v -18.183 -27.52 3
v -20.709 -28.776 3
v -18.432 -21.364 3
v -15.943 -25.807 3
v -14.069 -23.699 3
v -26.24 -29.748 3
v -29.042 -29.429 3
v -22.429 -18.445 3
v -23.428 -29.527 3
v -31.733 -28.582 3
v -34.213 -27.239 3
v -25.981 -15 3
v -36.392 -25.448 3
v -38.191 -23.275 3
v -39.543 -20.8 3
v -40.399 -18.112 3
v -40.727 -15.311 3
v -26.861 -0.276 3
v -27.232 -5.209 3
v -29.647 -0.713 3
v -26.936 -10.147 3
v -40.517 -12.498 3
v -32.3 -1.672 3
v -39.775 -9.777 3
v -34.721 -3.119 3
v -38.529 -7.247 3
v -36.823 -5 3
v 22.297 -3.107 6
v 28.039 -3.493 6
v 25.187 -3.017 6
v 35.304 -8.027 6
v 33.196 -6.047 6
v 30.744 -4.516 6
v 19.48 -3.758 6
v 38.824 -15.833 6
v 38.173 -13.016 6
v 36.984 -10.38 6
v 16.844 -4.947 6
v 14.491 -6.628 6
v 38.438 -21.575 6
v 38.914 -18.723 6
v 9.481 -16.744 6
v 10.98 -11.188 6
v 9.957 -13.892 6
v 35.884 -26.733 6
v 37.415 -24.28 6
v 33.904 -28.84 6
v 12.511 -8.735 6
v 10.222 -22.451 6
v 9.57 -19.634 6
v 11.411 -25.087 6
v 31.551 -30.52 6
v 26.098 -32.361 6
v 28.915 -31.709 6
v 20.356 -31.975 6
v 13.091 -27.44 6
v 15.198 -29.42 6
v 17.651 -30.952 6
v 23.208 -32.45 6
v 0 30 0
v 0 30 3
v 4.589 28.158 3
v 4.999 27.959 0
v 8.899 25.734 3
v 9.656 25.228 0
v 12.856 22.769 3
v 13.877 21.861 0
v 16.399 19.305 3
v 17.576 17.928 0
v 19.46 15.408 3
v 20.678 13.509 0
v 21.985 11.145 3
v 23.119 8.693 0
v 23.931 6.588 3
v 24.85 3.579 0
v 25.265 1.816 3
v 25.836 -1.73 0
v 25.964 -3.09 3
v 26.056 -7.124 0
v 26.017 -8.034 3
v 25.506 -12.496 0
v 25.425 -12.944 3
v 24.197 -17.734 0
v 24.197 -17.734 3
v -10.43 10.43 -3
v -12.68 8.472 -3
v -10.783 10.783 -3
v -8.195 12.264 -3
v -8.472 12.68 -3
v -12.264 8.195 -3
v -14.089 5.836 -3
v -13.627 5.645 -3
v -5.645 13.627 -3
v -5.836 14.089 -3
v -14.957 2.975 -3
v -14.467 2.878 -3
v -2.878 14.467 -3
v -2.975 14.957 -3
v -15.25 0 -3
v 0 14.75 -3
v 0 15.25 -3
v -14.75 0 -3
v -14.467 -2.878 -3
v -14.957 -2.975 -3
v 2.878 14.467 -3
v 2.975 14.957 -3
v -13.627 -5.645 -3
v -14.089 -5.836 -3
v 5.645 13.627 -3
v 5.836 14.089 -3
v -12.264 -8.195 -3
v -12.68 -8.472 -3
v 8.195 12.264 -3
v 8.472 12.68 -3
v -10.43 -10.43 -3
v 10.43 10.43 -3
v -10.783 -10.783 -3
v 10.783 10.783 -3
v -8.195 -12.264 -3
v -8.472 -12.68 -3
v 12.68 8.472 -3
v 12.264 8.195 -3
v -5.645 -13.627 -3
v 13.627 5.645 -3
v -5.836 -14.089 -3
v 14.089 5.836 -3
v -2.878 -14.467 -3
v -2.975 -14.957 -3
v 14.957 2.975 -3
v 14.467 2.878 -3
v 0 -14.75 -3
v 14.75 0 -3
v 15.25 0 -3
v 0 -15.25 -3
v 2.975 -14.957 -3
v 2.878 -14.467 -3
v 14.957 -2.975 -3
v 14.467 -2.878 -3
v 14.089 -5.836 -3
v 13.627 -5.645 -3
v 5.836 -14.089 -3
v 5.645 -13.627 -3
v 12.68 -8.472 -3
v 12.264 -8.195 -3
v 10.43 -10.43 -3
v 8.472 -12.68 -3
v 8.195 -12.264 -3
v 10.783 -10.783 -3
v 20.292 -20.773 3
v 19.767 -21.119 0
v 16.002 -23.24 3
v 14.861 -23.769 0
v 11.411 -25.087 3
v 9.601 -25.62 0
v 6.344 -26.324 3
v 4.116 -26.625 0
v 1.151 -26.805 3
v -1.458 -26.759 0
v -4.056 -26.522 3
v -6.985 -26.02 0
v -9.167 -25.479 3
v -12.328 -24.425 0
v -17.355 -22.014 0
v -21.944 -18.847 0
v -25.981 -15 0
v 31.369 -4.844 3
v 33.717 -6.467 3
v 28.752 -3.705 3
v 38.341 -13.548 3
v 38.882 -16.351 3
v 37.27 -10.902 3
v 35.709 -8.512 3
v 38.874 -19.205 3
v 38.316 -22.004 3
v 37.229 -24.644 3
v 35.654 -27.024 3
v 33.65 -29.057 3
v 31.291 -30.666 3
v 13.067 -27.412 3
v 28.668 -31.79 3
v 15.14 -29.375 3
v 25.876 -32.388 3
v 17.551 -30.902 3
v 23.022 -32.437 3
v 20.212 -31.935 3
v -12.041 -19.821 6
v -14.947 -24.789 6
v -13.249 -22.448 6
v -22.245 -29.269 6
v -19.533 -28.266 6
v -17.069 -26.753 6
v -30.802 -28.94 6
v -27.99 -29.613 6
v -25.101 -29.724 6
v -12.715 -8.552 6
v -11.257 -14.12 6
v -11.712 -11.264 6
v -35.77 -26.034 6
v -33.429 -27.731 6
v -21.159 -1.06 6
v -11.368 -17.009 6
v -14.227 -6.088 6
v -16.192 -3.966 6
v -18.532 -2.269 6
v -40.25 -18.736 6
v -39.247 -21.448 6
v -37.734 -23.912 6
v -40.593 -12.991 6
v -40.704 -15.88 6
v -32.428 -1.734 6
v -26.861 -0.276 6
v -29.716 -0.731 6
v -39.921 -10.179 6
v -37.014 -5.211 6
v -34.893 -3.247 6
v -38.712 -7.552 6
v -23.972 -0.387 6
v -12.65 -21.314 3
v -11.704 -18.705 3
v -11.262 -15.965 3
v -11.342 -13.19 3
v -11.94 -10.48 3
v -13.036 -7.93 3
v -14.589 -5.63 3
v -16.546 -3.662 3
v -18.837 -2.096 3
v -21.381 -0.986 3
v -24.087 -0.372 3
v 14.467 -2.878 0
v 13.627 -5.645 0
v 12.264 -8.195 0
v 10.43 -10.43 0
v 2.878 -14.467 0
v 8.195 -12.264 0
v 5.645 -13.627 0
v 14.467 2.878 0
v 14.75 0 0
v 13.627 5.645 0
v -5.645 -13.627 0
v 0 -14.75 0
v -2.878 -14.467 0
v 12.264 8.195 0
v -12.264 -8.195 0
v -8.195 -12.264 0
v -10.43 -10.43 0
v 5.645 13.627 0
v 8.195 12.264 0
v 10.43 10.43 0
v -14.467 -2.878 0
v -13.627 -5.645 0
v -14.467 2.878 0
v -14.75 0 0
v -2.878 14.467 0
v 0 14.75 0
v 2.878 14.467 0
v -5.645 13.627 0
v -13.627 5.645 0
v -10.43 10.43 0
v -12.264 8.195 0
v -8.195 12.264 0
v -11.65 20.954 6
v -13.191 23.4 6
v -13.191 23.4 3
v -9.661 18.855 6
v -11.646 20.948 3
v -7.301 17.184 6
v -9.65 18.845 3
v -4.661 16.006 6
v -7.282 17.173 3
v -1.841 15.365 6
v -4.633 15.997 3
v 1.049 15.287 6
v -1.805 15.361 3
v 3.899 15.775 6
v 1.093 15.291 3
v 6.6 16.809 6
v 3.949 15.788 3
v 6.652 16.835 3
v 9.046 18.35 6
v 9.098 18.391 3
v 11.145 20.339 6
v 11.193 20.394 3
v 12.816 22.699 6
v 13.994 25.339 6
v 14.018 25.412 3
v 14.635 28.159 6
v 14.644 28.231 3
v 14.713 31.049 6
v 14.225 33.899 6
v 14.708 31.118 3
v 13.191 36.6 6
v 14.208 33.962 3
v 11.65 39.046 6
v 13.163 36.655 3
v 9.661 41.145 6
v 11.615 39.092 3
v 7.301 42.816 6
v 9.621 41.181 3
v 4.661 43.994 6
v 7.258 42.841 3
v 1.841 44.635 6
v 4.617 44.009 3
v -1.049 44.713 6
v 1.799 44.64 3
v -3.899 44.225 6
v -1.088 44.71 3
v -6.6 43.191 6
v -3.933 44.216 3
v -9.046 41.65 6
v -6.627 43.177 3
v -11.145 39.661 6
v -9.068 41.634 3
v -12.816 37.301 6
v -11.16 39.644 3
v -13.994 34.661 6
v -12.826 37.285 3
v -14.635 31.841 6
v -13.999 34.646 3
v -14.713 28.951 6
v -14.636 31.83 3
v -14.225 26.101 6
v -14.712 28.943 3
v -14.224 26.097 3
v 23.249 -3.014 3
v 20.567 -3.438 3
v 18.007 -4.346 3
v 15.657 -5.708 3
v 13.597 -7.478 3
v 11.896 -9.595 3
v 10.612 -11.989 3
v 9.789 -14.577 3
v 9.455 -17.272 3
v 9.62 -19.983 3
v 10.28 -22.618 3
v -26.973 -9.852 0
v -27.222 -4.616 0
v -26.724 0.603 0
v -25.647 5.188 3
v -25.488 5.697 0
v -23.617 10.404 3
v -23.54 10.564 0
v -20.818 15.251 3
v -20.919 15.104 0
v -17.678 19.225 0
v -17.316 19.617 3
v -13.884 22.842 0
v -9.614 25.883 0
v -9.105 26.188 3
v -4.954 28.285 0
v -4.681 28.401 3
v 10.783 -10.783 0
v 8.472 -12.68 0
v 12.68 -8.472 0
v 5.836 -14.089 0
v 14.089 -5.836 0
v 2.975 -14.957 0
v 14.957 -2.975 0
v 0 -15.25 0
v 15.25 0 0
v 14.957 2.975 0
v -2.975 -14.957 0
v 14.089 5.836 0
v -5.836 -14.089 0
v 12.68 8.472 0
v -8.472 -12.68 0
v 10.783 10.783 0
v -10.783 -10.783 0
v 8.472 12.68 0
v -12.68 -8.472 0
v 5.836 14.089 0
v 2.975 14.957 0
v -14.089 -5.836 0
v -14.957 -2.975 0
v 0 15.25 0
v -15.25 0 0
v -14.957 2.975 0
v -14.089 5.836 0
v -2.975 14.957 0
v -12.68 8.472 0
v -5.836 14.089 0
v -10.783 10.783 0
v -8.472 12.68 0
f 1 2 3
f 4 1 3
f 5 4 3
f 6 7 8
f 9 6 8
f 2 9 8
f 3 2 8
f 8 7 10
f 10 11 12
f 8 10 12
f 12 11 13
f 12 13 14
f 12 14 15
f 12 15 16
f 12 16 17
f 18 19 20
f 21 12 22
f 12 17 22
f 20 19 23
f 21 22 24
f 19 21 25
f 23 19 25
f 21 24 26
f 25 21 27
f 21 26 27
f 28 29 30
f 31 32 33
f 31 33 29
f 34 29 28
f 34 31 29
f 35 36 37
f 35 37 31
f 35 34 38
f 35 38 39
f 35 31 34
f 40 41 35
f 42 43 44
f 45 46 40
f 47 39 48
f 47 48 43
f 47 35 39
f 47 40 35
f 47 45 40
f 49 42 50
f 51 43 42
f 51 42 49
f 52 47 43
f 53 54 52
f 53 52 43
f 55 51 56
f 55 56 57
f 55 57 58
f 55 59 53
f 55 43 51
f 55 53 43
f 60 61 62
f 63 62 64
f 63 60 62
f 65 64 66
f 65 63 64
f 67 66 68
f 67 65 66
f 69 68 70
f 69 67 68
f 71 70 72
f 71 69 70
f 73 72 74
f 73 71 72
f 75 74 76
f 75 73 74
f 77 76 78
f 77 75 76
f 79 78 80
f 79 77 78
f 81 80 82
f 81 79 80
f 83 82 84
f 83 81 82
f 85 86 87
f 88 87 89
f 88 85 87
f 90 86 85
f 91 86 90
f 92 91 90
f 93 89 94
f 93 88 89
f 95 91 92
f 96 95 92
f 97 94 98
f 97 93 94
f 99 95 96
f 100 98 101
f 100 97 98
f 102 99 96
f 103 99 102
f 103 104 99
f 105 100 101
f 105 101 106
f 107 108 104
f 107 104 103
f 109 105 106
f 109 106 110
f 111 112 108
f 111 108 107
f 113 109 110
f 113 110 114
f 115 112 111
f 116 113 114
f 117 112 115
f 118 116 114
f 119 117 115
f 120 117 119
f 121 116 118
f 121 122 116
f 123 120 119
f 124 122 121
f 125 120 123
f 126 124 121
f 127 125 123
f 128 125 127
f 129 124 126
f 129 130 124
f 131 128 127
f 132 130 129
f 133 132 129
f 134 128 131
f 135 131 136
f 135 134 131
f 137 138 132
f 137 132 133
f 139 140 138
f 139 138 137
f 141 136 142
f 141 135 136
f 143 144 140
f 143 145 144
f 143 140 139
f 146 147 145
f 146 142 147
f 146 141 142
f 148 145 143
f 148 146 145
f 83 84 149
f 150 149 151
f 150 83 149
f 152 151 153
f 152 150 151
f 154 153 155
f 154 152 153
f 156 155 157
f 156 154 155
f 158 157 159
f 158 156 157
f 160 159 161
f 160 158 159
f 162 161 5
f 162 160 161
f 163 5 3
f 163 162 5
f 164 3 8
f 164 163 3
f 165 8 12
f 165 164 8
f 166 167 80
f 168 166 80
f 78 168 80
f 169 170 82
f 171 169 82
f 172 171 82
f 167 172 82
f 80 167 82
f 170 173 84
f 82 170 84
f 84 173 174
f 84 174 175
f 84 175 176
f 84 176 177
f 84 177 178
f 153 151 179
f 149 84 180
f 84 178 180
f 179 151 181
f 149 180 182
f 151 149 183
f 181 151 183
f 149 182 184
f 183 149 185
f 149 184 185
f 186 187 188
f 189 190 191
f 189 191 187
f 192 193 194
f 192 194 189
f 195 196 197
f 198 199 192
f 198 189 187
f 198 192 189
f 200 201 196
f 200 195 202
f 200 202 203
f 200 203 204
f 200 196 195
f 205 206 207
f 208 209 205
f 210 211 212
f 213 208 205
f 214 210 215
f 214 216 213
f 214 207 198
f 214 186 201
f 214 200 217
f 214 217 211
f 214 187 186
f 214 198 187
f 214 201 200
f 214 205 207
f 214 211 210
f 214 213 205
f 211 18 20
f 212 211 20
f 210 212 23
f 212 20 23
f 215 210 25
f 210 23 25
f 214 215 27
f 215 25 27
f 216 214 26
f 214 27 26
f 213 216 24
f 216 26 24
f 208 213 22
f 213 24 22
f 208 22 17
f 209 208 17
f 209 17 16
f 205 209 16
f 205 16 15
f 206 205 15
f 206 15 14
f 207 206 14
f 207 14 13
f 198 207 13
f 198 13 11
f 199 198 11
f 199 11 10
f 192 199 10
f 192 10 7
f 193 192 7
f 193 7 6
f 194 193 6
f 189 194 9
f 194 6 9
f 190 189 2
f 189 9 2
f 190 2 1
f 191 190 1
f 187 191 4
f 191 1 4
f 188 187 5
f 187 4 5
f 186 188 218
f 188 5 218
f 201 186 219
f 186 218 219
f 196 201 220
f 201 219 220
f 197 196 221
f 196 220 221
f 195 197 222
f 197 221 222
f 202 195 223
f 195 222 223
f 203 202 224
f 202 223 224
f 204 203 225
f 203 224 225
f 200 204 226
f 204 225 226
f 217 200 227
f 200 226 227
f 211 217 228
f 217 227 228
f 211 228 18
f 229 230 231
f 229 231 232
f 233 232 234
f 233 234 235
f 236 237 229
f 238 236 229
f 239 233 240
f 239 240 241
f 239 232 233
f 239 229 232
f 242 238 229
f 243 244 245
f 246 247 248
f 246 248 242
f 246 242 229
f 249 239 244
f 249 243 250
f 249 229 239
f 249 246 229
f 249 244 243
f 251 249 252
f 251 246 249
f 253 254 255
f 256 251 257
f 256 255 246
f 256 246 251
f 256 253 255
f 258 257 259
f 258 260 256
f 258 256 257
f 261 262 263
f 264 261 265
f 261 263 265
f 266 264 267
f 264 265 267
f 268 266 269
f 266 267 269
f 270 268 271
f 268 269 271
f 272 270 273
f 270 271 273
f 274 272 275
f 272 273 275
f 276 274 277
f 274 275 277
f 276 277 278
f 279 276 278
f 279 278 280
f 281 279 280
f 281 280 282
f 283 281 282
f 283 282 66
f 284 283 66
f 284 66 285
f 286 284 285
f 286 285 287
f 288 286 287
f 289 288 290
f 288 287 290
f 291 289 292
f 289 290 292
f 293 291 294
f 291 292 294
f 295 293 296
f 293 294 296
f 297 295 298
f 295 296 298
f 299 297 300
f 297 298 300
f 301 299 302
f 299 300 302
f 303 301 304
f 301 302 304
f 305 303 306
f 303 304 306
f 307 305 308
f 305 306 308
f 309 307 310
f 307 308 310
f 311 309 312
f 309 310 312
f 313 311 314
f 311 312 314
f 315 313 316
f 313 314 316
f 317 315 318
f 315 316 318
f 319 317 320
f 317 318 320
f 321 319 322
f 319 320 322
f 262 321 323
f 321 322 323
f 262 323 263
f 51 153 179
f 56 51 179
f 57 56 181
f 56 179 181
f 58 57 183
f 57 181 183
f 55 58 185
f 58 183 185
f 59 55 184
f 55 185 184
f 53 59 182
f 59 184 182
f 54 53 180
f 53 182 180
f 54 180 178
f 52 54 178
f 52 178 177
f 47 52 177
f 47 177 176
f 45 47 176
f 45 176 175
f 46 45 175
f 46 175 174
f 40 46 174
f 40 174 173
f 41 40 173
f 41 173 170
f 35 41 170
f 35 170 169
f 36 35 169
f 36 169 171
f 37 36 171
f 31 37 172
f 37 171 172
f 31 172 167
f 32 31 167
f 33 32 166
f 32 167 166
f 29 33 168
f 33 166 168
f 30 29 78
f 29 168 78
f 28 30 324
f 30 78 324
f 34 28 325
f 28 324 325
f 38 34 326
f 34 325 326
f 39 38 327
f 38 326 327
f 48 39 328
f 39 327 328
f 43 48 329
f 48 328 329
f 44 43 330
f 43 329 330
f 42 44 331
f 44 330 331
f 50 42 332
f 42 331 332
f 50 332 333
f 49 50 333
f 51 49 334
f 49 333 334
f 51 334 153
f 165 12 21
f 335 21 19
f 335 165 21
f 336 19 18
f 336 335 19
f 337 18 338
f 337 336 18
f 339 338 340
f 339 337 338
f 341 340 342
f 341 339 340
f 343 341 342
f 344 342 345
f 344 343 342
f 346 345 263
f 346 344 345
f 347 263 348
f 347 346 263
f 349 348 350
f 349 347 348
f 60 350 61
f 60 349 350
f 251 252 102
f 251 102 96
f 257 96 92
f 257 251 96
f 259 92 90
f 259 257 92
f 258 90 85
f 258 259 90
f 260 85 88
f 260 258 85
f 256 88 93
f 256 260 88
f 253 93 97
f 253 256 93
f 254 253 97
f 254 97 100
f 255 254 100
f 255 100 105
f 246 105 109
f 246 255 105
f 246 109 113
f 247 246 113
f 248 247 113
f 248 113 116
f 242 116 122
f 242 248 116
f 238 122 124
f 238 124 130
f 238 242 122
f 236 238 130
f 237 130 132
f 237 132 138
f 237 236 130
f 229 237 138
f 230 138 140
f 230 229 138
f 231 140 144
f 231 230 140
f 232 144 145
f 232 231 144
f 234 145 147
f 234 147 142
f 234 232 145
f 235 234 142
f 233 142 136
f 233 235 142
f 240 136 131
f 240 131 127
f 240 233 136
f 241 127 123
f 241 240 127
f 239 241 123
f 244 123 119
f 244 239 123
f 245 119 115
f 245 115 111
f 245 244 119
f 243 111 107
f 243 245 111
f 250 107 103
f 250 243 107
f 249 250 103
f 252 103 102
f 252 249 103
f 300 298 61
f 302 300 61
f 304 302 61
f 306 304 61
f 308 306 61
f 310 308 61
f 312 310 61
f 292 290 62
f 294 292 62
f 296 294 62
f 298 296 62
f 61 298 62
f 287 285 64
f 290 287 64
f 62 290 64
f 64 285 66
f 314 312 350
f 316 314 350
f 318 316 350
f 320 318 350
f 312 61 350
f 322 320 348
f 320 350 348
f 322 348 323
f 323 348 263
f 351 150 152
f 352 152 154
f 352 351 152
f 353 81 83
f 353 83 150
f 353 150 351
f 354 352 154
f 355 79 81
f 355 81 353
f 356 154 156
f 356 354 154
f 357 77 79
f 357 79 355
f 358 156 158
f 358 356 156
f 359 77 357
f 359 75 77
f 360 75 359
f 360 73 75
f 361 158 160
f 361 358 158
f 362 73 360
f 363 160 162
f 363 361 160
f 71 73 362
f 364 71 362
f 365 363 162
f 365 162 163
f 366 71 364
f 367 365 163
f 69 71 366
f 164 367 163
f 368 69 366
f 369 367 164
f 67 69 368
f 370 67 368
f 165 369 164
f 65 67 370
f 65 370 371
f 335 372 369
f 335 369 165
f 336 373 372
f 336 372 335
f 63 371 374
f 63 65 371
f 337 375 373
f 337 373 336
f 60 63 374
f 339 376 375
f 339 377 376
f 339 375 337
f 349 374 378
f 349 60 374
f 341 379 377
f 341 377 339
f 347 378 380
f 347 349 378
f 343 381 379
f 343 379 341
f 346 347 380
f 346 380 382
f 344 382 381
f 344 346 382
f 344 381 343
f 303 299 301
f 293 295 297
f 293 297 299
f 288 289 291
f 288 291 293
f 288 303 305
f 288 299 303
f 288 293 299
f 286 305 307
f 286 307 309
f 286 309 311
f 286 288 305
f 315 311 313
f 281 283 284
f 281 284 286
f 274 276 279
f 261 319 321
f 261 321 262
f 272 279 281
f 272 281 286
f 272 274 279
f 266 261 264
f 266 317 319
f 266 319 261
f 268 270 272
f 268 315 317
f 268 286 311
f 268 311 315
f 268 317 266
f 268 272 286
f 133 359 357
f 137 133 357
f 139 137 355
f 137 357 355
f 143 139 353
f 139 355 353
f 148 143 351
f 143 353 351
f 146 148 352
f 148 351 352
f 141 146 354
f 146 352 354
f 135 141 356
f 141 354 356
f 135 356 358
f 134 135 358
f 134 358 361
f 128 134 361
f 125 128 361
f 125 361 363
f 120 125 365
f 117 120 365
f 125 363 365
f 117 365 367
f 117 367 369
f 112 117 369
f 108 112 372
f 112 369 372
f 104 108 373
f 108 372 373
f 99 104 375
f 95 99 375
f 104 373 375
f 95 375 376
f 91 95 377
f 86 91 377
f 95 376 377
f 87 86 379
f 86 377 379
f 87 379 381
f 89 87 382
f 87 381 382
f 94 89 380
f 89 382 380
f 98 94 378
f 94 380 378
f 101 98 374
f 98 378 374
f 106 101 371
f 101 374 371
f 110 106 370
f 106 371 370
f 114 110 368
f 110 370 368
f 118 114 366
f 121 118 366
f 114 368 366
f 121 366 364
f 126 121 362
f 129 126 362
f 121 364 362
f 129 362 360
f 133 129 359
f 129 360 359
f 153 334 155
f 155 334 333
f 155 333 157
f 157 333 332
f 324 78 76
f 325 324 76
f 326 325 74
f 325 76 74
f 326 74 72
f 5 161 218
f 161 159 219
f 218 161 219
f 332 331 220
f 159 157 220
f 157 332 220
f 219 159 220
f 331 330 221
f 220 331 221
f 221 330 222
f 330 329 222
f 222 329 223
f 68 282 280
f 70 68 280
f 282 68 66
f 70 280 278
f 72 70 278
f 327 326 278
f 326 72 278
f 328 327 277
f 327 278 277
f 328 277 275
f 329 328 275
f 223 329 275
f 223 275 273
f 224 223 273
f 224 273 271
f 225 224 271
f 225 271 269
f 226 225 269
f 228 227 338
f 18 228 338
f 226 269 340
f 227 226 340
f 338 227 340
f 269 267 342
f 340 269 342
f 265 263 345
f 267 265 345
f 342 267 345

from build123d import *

# Parameters (mm, degrees)
BOSS_EXTRUDE1_DEPTH = 3
SKETCH2_R           = 14.75
BOSS_EXTRUDE2_DEPTH = 3
SKETCH5_R           = 15.25
SKETCH5_R_2         = 14.75
BOSS_EXTRUDE3_DEPTH = 3


with BuildPart() as part:
    # Sketch1 → Boss-Extrude1 (new body)
    with BuildSketch(Plane.XY):
        with BuildLine():
            ThreePointArc((0, 30), (21.984686874, 11.144587301), (24.197417864, -17.733724051))
            ThreePointArc((24.197417864, -17.733724051), (-1.457844914, -26.759103366), (-25.980762114, -15))
            ThreePointArc((-25.980762114, -15), (-22.31018621, 12.880792014), (0, 30))
        make_face()
    extrude(amount=BOSS_EXTRUDE1_DEPTH)

    # Sketch2 → Boss-Extrude2 (add)
    with BuildSketch(Plane.XY.offset(3)):
        with Locations(Location((0, 30, 0), (0, 0, 206.579187248))):
            Circle(SKETCH2_R)
        with Locations(Location((24.197417864, -17.733724051, 0), (0, 0, 209.902892112))):
            Circle(SKETCH2_R)
        with Locations(Location((-25.980762114, -15, 0), (0, 0, 93.420812752))):
            Circle(SKETCH2_R)
    extrude(amount=BOSS_EXTRUDE2_DEPTH)

    # Sketch5 → Boss-Extrude3 (add)
    with BuildSketch(Plane(origin=(0, 0, 0), x_dir=(-1, 0, 0), z_dir=(0, 0, -1))):
        with Locations(Location((0, 0, 0), (0, 0, 180))):
            Circle(SKETCH5_R)
        Circle(SKETCH5_R_2, mode=Mode.SUBTRACT)
    extrude(amount=BOSS_EXTRUDE3_DEPTH)


solid = part.part
